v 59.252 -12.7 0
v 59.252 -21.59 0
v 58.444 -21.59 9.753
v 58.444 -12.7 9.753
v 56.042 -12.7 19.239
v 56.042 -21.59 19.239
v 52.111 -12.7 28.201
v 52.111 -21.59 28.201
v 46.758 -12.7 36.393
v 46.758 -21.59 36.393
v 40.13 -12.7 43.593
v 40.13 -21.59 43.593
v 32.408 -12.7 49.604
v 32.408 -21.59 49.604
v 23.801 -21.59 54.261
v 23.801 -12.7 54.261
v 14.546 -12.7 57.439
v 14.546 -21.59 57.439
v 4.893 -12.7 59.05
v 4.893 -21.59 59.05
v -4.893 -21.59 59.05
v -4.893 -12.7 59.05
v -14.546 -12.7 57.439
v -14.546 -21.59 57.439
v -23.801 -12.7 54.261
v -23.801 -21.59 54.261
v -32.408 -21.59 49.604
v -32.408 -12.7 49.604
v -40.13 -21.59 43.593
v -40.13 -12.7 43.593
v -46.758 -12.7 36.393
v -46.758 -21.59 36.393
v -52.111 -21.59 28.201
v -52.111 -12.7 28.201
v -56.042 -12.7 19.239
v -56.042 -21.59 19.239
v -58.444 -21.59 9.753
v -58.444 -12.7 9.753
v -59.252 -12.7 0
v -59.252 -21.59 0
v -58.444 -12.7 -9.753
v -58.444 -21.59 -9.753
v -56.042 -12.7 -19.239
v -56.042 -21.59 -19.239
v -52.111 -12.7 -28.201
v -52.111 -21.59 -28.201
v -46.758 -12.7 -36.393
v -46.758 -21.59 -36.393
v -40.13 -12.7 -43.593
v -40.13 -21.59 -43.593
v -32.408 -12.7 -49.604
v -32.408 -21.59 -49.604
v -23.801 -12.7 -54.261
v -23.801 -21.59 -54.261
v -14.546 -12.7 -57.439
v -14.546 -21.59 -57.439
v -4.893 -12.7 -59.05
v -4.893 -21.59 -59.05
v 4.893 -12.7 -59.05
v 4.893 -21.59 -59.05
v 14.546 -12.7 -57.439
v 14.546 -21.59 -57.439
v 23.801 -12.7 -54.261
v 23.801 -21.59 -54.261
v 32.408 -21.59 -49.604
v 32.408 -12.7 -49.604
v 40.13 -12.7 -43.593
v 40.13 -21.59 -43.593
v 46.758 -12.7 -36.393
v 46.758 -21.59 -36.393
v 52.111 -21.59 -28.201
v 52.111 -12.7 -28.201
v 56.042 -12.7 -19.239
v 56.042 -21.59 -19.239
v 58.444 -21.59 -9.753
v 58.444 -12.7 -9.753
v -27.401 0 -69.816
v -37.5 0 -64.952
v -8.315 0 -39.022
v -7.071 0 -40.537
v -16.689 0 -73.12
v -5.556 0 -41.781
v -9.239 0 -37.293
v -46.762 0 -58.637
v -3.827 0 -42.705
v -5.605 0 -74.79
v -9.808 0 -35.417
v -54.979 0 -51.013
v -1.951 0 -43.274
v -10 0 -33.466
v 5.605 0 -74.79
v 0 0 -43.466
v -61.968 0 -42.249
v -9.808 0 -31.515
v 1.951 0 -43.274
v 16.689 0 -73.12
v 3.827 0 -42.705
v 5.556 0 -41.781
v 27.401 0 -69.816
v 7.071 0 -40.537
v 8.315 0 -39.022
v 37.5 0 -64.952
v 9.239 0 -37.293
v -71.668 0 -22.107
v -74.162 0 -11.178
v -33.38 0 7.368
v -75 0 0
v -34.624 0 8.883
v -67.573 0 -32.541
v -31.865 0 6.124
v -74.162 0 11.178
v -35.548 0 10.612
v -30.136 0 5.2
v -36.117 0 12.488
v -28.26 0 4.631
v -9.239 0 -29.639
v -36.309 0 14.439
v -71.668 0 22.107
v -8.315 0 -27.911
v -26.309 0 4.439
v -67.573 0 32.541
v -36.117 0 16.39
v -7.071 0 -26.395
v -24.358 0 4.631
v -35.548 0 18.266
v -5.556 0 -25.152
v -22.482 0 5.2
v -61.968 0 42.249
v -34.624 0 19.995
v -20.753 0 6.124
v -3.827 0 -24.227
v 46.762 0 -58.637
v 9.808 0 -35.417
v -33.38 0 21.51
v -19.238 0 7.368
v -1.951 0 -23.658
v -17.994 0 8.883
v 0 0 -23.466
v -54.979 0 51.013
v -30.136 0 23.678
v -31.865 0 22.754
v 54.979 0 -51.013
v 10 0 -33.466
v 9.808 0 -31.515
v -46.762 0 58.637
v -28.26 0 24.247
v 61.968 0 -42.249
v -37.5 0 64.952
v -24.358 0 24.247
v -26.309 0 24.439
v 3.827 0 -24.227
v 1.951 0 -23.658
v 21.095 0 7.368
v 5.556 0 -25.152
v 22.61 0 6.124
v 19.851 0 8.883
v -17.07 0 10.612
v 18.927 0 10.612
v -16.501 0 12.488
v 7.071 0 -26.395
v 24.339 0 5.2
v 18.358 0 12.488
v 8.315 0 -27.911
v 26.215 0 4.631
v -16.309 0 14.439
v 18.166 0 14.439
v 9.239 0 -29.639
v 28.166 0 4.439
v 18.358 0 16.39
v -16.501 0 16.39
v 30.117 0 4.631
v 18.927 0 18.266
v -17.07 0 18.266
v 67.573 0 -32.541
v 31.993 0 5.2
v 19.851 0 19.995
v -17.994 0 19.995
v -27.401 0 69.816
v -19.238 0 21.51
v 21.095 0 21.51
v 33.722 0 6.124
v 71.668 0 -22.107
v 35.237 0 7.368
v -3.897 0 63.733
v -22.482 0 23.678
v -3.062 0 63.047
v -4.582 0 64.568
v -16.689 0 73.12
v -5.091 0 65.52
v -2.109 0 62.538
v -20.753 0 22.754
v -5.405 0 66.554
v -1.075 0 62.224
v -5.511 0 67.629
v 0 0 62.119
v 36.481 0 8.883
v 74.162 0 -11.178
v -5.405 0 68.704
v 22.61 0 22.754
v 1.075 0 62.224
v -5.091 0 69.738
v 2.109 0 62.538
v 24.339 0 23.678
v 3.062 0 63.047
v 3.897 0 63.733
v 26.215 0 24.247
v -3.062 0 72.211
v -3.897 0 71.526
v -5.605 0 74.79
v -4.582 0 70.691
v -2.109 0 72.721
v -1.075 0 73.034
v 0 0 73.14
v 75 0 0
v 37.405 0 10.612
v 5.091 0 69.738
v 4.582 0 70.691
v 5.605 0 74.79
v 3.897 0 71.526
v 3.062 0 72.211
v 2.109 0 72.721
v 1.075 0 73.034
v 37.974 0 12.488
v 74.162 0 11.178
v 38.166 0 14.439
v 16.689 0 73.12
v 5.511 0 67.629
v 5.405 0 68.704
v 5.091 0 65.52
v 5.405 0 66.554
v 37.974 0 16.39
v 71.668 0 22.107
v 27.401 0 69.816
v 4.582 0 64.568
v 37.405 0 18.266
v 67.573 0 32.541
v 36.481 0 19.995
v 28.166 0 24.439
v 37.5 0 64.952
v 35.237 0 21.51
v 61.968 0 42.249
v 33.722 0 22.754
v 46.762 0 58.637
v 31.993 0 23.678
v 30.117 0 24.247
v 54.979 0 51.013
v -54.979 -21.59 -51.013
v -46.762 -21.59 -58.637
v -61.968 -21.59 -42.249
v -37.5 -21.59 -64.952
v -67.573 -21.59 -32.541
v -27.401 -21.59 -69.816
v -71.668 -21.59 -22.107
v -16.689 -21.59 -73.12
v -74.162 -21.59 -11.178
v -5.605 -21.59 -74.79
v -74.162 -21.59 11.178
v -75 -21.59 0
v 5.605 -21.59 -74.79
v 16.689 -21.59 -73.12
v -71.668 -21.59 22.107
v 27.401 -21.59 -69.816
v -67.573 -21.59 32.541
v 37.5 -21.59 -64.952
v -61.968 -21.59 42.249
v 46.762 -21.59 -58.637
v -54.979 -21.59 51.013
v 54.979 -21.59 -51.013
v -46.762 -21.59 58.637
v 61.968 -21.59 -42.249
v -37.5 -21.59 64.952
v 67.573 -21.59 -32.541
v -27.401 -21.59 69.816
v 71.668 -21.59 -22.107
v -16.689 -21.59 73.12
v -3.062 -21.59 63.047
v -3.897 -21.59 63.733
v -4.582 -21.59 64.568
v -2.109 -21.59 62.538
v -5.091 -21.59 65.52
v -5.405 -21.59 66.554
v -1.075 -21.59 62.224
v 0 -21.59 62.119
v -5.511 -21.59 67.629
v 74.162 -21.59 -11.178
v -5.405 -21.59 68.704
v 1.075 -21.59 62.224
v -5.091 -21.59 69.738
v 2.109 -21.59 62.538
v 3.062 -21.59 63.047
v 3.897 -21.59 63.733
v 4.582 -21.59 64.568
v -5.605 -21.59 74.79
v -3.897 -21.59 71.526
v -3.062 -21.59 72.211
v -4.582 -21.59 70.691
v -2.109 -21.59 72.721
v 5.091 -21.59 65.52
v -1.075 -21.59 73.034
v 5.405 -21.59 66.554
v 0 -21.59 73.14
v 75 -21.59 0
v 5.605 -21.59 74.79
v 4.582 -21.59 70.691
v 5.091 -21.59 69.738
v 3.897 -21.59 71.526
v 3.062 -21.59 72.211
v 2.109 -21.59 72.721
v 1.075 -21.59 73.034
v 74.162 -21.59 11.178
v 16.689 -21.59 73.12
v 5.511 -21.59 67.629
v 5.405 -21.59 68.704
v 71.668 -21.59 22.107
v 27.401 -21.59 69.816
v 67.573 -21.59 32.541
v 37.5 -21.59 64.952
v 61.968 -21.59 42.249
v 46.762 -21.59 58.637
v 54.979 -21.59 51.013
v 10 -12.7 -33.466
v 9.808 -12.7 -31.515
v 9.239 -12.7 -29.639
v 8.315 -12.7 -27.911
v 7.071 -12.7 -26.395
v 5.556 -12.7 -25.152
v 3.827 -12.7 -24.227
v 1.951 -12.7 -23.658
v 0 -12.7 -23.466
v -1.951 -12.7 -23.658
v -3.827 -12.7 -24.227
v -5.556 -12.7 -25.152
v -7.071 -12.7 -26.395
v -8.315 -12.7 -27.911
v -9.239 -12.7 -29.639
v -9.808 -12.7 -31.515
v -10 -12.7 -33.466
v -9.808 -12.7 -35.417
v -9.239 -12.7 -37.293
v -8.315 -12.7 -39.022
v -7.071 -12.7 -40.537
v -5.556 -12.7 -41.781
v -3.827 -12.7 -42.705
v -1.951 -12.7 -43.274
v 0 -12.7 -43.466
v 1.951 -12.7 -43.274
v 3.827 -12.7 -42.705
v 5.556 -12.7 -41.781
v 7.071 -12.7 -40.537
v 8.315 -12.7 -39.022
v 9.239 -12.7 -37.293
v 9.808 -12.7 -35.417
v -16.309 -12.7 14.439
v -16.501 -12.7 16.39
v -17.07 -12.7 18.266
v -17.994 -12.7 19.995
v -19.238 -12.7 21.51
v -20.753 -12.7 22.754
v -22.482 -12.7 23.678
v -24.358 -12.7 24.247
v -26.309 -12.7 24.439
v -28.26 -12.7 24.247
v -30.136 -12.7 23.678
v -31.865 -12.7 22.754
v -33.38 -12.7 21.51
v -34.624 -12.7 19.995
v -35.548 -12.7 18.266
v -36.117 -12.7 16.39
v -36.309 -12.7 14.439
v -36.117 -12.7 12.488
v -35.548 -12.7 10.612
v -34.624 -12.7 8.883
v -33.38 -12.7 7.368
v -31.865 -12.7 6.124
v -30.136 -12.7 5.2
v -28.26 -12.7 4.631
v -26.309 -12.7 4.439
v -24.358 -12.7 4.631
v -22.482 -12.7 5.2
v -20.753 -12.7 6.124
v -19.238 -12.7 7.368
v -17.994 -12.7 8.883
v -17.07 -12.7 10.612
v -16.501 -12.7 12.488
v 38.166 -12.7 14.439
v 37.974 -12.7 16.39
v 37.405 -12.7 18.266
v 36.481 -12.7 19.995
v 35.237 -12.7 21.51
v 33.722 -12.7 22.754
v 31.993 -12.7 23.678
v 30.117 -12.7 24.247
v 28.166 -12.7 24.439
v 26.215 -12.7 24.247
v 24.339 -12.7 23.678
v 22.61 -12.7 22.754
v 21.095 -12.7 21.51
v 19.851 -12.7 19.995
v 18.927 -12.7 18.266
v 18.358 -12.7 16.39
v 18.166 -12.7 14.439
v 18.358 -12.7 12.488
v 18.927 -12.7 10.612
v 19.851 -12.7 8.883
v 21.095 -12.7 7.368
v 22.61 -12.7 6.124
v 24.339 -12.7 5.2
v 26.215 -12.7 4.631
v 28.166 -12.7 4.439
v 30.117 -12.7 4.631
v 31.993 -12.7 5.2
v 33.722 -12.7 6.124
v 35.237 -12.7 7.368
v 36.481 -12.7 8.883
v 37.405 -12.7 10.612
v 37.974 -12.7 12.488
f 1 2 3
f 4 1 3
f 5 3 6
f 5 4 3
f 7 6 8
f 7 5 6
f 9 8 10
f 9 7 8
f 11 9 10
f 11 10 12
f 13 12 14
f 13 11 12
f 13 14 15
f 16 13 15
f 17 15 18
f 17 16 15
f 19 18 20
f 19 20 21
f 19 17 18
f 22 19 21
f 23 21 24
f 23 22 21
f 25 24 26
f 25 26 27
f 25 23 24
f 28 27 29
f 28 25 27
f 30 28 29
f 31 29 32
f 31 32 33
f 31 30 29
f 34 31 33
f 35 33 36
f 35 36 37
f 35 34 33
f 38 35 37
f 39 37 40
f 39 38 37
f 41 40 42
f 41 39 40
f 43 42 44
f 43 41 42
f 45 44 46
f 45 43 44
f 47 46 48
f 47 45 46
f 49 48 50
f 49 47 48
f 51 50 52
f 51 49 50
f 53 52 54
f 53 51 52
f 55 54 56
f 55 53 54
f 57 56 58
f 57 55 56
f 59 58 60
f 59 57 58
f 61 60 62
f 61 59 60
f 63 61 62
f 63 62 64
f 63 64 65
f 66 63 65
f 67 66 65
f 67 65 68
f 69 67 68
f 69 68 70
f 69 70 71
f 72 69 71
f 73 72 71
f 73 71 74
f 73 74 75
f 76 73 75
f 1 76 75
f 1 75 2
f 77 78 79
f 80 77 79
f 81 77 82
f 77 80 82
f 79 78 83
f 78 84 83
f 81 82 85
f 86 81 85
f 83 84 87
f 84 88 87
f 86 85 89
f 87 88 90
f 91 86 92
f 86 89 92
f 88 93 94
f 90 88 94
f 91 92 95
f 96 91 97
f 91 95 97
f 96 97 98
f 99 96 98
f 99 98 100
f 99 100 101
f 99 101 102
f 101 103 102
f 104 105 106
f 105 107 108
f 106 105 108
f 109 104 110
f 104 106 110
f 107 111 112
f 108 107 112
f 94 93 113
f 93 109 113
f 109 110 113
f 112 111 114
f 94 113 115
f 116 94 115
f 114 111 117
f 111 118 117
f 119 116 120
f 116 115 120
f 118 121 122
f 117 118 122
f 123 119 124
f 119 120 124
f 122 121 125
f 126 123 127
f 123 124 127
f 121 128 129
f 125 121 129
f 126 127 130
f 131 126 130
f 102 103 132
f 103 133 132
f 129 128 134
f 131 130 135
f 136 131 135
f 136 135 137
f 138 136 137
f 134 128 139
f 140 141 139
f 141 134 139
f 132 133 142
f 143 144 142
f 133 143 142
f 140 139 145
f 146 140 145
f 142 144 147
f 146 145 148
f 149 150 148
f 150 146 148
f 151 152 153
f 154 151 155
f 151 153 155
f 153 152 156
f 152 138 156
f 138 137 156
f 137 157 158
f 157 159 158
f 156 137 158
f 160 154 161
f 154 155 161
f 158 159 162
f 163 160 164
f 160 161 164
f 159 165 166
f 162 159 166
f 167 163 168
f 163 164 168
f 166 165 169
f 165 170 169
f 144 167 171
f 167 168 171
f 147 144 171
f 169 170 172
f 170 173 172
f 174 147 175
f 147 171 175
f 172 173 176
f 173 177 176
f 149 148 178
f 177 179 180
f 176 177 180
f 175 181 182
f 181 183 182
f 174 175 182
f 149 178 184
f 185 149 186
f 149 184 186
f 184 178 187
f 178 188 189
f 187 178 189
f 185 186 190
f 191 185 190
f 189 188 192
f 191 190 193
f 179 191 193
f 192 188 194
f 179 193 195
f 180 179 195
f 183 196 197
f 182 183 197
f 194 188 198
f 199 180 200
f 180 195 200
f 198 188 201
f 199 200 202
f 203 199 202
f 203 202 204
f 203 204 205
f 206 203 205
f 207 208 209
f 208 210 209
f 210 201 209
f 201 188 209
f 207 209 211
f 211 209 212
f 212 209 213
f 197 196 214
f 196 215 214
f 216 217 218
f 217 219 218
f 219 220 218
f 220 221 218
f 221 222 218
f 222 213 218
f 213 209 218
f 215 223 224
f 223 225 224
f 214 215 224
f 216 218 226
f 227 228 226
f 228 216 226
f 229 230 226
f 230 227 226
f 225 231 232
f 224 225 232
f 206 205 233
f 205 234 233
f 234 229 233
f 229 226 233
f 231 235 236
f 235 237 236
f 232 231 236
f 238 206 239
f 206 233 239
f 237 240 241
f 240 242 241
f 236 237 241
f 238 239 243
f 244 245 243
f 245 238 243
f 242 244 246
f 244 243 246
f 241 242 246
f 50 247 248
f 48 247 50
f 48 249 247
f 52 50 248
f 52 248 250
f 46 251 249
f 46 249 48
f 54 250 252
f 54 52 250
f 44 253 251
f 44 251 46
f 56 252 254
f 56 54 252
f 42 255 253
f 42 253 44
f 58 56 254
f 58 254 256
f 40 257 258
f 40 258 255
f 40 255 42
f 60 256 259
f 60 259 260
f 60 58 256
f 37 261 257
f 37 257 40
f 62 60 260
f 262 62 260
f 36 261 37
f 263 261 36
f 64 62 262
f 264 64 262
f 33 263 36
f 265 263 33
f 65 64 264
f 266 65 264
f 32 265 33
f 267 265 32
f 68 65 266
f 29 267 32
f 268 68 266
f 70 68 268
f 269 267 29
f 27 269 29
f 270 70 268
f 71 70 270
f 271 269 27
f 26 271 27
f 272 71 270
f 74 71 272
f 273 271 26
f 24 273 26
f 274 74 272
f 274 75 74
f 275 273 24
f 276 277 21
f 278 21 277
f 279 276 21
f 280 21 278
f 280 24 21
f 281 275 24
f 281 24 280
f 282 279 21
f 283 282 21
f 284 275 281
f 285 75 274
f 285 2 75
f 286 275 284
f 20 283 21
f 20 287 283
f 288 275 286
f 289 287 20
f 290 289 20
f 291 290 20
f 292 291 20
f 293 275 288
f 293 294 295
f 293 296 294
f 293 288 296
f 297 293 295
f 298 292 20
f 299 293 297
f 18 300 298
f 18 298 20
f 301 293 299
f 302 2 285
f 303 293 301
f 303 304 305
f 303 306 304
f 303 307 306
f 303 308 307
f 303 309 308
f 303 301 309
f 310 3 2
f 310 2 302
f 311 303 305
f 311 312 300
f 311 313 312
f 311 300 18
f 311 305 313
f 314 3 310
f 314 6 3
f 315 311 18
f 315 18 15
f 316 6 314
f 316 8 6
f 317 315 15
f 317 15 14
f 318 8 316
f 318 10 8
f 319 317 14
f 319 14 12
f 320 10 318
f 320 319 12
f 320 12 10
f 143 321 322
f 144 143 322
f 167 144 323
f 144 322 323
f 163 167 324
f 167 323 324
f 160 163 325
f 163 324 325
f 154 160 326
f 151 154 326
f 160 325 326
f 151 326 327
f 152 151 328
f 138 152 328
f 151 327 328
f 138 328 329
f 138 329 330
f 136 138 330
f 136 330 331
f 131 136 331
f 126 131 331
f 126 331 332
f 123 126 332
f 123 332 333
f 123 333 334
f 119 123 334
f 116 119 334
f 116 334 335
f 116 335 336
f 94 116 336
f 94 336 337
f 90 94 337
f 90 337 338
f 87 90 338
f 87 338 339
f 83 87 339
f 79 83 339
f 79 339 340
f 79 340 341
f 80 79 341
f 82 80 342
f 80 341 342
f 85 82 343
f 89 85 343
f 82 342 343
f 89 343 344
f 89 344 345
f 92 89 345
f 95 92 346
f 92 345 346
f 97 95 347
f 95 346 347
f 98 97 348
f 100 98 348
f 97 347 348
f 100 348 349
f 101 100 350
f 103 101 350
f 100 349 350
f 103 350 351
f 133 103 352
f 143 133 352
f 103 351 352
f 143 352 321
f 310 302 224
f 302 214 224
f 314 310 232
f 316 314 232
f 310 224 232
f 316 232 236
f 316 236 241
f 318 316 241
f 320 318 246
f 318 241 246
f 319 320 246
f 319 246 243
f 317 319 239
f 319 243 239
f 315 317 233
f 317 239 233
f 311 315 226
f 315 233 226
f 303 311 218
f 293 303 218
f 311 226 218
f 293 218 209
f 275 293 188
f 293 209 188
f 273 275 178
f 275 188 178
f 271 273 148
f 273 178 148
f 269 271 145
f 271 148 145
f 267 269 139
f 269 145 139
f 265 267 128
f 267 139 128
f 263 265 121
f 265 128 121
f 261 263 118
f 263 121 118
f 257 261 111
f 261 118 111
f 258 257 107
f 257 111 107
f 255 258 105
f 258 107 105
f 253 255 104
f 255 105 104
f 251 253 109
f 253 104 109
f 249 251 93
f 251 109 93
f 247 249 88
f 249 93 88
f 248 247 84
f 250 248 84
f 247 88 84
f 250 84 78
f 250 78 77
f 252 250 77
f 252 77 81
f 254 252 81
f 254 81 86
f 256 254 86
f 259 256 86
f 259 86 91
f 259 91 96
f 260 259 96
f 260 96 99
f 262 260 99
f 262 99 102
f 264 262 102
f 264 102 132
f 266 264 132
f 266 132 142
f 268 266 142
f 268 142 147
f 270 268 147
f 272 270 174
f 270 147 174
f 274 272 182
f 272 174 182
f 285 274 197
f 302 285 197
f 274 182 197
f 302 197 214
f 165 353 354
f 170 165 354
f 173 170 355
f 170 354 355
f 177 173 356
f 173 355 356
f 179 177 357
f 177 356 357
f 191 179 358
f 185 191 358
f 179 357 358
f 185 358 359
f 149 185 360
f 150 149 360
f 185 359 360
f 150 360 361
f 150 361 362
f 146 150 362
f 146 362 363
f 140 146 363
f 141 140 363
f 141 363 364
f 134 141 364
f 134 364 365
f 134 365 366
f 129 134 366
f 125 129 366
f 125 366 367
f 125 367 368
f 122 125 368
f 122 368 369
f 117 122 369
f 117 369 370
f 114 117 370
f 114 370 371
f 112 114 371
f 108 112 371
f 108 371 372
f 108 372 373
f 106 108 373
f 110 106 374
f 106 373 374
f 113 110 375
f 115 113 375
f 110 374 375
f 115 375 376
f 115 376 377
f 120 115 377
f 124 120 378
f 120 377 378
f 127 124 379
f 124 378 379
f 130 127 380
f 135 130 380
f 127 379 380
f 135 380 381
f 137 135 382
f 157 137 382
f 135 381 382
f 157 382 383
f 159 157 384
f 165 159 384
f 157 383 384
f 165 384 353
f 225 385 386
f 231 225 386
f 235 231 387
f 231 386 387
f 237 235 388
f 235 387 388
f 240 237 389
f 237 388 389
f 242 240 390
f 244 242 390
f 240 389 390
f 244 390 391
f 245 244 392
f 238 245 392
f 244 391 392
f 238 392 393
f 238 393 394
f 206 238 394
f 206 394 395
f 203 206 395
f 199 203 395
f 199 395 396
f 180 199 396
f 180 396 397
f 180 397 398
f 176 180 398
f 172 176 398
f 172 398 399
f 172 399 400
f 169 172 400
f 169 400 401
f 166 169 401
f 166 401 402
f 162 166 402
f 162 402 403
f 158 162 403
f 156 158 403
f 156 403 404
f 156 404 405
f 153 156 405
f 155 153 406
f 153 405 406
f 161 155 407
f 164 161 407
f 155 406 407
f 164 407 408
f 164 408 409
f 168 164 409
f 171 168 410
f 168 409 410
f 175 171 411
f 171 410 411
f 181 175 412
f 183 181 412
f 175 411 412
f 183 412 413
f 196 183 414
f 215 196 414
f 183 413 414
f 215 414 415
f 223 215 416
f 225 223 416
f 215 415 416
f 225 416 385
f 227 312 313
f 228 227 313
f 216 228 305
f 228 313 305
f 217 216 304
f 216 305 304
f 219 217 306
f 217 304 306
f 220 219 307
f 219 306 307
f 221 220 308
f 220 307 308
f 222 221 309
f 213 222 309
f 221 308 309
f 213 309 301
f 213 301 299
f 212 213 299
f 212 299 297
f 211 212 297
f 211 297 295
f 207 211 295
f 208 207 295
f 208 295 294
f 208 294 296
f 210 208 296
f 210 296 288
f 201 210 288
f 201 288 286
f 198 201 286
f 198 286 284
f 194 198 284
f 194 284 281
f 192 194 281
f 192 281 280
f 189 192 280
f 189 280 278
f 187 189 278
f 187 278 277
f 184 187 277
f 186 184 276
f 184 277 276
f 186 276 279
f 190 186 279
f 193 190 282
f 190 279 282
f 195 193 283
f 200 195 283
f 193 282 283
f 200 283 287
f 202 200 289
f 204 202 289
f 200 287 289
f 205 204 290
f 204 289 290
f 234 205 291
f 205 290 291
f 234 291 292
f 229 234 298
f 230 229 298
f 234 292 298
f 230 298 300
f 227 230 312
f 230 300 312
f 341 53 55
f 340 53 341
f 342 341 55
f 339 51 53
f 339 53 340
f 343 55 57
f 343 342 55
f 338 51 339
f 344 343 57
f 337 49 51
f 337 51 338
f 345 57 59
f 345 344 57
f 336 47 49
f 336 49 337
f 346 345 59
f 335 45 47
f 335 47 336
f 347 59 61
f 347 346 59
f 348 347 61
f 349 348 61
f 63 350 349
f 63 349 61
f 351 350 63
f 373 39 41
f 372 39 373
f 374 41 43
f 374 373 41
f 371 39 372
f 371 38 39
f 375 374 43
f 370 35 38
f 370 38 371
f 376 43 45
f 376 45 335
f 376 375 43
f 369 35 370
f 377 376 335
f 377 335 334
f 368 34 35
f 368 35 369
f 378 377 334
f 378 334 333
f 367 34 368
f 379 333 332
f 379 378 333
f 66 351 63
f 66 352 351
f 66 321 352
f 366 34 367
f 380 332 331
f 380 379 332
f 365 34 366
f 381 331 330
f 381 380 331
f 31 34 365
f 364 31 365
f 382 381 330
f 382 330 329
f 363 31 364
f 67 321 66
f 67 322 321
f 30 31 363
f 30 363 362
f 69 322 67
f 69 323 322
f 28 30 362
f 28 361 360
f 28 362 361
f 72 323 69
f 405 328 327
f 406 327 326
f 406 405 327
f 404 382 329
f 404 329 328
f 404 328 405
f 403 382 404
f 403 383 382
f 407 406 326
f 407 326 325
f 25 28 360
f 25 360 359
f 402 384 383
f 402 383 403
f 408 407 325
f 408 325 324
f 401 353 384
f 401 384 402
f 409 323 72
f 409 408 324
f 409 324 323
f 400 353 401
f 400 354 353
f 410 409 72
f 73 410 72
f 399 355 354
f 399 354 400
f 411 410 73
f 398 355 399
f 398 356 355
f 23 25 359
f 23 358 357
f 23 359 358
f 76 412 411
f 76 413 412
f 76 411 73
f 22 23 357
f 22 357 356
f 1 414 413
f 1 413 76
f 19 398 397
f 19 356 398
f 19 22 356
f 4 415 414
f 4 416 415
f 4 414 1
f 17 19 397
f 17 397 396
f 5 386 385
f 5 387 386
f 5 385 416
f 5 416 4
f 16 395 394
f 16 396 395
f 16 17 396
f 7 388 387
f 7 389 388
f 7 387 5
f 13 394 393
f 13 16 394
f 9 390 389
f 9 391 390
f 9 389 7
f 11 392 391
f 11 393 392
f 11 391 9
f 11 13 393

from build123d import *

# Parameters (mm, degrees)
F0_R     = 75
F1_DEPTH = 12.7
F2_R     = 75
F2_R_2   = 59.252001
F3_DEPTH = 8.89
F4_R     = 10
F5_DEPTH = 25.4
F6_R     = 5.510782
F7_DEPTH = 25.4


with BuildPart() as f1:
    # F0 (on Front) → F1 (new body)
    with BuildSketch(Plane.XZ):
        Circle(F0_R)
    extrude(amount=F1_DEPTH)

    # F2 (on face) → F3 (join)
    with BuildSketch(Plane.XZ.offset(12.7)):
        Circle(F2_R)
        Circle(F2_R_2, mode=Mode.SUBTRACT)
    extrude(amount=F3_DEPTH)

    # F4 (on face) → F5 (cut)
    with BuildSketch(Plane.XZ.offset(12.7)):
        with Locations((-26.308898, 14.438962)):
            Circle(F4_R)
        with Locations((28.165994, 14.438962)):
            Circle(F4_R)
        with Locations((0, -33.466256)):
            Circle(F4_R)
    extrude(amount=-F5_DEPTH, mode=Mode.SUBTRACT)

    # F6 (on face) → F7 (cut)
    with BuildSketch(Plane.XZ.offset(21.59)):
        with Locations((0, 67.629345)):
            Circle(F6_R)
    extrude(amount=-F7_DEPTH, mode=Mode.SUBTRACT)


solid = f1.part
